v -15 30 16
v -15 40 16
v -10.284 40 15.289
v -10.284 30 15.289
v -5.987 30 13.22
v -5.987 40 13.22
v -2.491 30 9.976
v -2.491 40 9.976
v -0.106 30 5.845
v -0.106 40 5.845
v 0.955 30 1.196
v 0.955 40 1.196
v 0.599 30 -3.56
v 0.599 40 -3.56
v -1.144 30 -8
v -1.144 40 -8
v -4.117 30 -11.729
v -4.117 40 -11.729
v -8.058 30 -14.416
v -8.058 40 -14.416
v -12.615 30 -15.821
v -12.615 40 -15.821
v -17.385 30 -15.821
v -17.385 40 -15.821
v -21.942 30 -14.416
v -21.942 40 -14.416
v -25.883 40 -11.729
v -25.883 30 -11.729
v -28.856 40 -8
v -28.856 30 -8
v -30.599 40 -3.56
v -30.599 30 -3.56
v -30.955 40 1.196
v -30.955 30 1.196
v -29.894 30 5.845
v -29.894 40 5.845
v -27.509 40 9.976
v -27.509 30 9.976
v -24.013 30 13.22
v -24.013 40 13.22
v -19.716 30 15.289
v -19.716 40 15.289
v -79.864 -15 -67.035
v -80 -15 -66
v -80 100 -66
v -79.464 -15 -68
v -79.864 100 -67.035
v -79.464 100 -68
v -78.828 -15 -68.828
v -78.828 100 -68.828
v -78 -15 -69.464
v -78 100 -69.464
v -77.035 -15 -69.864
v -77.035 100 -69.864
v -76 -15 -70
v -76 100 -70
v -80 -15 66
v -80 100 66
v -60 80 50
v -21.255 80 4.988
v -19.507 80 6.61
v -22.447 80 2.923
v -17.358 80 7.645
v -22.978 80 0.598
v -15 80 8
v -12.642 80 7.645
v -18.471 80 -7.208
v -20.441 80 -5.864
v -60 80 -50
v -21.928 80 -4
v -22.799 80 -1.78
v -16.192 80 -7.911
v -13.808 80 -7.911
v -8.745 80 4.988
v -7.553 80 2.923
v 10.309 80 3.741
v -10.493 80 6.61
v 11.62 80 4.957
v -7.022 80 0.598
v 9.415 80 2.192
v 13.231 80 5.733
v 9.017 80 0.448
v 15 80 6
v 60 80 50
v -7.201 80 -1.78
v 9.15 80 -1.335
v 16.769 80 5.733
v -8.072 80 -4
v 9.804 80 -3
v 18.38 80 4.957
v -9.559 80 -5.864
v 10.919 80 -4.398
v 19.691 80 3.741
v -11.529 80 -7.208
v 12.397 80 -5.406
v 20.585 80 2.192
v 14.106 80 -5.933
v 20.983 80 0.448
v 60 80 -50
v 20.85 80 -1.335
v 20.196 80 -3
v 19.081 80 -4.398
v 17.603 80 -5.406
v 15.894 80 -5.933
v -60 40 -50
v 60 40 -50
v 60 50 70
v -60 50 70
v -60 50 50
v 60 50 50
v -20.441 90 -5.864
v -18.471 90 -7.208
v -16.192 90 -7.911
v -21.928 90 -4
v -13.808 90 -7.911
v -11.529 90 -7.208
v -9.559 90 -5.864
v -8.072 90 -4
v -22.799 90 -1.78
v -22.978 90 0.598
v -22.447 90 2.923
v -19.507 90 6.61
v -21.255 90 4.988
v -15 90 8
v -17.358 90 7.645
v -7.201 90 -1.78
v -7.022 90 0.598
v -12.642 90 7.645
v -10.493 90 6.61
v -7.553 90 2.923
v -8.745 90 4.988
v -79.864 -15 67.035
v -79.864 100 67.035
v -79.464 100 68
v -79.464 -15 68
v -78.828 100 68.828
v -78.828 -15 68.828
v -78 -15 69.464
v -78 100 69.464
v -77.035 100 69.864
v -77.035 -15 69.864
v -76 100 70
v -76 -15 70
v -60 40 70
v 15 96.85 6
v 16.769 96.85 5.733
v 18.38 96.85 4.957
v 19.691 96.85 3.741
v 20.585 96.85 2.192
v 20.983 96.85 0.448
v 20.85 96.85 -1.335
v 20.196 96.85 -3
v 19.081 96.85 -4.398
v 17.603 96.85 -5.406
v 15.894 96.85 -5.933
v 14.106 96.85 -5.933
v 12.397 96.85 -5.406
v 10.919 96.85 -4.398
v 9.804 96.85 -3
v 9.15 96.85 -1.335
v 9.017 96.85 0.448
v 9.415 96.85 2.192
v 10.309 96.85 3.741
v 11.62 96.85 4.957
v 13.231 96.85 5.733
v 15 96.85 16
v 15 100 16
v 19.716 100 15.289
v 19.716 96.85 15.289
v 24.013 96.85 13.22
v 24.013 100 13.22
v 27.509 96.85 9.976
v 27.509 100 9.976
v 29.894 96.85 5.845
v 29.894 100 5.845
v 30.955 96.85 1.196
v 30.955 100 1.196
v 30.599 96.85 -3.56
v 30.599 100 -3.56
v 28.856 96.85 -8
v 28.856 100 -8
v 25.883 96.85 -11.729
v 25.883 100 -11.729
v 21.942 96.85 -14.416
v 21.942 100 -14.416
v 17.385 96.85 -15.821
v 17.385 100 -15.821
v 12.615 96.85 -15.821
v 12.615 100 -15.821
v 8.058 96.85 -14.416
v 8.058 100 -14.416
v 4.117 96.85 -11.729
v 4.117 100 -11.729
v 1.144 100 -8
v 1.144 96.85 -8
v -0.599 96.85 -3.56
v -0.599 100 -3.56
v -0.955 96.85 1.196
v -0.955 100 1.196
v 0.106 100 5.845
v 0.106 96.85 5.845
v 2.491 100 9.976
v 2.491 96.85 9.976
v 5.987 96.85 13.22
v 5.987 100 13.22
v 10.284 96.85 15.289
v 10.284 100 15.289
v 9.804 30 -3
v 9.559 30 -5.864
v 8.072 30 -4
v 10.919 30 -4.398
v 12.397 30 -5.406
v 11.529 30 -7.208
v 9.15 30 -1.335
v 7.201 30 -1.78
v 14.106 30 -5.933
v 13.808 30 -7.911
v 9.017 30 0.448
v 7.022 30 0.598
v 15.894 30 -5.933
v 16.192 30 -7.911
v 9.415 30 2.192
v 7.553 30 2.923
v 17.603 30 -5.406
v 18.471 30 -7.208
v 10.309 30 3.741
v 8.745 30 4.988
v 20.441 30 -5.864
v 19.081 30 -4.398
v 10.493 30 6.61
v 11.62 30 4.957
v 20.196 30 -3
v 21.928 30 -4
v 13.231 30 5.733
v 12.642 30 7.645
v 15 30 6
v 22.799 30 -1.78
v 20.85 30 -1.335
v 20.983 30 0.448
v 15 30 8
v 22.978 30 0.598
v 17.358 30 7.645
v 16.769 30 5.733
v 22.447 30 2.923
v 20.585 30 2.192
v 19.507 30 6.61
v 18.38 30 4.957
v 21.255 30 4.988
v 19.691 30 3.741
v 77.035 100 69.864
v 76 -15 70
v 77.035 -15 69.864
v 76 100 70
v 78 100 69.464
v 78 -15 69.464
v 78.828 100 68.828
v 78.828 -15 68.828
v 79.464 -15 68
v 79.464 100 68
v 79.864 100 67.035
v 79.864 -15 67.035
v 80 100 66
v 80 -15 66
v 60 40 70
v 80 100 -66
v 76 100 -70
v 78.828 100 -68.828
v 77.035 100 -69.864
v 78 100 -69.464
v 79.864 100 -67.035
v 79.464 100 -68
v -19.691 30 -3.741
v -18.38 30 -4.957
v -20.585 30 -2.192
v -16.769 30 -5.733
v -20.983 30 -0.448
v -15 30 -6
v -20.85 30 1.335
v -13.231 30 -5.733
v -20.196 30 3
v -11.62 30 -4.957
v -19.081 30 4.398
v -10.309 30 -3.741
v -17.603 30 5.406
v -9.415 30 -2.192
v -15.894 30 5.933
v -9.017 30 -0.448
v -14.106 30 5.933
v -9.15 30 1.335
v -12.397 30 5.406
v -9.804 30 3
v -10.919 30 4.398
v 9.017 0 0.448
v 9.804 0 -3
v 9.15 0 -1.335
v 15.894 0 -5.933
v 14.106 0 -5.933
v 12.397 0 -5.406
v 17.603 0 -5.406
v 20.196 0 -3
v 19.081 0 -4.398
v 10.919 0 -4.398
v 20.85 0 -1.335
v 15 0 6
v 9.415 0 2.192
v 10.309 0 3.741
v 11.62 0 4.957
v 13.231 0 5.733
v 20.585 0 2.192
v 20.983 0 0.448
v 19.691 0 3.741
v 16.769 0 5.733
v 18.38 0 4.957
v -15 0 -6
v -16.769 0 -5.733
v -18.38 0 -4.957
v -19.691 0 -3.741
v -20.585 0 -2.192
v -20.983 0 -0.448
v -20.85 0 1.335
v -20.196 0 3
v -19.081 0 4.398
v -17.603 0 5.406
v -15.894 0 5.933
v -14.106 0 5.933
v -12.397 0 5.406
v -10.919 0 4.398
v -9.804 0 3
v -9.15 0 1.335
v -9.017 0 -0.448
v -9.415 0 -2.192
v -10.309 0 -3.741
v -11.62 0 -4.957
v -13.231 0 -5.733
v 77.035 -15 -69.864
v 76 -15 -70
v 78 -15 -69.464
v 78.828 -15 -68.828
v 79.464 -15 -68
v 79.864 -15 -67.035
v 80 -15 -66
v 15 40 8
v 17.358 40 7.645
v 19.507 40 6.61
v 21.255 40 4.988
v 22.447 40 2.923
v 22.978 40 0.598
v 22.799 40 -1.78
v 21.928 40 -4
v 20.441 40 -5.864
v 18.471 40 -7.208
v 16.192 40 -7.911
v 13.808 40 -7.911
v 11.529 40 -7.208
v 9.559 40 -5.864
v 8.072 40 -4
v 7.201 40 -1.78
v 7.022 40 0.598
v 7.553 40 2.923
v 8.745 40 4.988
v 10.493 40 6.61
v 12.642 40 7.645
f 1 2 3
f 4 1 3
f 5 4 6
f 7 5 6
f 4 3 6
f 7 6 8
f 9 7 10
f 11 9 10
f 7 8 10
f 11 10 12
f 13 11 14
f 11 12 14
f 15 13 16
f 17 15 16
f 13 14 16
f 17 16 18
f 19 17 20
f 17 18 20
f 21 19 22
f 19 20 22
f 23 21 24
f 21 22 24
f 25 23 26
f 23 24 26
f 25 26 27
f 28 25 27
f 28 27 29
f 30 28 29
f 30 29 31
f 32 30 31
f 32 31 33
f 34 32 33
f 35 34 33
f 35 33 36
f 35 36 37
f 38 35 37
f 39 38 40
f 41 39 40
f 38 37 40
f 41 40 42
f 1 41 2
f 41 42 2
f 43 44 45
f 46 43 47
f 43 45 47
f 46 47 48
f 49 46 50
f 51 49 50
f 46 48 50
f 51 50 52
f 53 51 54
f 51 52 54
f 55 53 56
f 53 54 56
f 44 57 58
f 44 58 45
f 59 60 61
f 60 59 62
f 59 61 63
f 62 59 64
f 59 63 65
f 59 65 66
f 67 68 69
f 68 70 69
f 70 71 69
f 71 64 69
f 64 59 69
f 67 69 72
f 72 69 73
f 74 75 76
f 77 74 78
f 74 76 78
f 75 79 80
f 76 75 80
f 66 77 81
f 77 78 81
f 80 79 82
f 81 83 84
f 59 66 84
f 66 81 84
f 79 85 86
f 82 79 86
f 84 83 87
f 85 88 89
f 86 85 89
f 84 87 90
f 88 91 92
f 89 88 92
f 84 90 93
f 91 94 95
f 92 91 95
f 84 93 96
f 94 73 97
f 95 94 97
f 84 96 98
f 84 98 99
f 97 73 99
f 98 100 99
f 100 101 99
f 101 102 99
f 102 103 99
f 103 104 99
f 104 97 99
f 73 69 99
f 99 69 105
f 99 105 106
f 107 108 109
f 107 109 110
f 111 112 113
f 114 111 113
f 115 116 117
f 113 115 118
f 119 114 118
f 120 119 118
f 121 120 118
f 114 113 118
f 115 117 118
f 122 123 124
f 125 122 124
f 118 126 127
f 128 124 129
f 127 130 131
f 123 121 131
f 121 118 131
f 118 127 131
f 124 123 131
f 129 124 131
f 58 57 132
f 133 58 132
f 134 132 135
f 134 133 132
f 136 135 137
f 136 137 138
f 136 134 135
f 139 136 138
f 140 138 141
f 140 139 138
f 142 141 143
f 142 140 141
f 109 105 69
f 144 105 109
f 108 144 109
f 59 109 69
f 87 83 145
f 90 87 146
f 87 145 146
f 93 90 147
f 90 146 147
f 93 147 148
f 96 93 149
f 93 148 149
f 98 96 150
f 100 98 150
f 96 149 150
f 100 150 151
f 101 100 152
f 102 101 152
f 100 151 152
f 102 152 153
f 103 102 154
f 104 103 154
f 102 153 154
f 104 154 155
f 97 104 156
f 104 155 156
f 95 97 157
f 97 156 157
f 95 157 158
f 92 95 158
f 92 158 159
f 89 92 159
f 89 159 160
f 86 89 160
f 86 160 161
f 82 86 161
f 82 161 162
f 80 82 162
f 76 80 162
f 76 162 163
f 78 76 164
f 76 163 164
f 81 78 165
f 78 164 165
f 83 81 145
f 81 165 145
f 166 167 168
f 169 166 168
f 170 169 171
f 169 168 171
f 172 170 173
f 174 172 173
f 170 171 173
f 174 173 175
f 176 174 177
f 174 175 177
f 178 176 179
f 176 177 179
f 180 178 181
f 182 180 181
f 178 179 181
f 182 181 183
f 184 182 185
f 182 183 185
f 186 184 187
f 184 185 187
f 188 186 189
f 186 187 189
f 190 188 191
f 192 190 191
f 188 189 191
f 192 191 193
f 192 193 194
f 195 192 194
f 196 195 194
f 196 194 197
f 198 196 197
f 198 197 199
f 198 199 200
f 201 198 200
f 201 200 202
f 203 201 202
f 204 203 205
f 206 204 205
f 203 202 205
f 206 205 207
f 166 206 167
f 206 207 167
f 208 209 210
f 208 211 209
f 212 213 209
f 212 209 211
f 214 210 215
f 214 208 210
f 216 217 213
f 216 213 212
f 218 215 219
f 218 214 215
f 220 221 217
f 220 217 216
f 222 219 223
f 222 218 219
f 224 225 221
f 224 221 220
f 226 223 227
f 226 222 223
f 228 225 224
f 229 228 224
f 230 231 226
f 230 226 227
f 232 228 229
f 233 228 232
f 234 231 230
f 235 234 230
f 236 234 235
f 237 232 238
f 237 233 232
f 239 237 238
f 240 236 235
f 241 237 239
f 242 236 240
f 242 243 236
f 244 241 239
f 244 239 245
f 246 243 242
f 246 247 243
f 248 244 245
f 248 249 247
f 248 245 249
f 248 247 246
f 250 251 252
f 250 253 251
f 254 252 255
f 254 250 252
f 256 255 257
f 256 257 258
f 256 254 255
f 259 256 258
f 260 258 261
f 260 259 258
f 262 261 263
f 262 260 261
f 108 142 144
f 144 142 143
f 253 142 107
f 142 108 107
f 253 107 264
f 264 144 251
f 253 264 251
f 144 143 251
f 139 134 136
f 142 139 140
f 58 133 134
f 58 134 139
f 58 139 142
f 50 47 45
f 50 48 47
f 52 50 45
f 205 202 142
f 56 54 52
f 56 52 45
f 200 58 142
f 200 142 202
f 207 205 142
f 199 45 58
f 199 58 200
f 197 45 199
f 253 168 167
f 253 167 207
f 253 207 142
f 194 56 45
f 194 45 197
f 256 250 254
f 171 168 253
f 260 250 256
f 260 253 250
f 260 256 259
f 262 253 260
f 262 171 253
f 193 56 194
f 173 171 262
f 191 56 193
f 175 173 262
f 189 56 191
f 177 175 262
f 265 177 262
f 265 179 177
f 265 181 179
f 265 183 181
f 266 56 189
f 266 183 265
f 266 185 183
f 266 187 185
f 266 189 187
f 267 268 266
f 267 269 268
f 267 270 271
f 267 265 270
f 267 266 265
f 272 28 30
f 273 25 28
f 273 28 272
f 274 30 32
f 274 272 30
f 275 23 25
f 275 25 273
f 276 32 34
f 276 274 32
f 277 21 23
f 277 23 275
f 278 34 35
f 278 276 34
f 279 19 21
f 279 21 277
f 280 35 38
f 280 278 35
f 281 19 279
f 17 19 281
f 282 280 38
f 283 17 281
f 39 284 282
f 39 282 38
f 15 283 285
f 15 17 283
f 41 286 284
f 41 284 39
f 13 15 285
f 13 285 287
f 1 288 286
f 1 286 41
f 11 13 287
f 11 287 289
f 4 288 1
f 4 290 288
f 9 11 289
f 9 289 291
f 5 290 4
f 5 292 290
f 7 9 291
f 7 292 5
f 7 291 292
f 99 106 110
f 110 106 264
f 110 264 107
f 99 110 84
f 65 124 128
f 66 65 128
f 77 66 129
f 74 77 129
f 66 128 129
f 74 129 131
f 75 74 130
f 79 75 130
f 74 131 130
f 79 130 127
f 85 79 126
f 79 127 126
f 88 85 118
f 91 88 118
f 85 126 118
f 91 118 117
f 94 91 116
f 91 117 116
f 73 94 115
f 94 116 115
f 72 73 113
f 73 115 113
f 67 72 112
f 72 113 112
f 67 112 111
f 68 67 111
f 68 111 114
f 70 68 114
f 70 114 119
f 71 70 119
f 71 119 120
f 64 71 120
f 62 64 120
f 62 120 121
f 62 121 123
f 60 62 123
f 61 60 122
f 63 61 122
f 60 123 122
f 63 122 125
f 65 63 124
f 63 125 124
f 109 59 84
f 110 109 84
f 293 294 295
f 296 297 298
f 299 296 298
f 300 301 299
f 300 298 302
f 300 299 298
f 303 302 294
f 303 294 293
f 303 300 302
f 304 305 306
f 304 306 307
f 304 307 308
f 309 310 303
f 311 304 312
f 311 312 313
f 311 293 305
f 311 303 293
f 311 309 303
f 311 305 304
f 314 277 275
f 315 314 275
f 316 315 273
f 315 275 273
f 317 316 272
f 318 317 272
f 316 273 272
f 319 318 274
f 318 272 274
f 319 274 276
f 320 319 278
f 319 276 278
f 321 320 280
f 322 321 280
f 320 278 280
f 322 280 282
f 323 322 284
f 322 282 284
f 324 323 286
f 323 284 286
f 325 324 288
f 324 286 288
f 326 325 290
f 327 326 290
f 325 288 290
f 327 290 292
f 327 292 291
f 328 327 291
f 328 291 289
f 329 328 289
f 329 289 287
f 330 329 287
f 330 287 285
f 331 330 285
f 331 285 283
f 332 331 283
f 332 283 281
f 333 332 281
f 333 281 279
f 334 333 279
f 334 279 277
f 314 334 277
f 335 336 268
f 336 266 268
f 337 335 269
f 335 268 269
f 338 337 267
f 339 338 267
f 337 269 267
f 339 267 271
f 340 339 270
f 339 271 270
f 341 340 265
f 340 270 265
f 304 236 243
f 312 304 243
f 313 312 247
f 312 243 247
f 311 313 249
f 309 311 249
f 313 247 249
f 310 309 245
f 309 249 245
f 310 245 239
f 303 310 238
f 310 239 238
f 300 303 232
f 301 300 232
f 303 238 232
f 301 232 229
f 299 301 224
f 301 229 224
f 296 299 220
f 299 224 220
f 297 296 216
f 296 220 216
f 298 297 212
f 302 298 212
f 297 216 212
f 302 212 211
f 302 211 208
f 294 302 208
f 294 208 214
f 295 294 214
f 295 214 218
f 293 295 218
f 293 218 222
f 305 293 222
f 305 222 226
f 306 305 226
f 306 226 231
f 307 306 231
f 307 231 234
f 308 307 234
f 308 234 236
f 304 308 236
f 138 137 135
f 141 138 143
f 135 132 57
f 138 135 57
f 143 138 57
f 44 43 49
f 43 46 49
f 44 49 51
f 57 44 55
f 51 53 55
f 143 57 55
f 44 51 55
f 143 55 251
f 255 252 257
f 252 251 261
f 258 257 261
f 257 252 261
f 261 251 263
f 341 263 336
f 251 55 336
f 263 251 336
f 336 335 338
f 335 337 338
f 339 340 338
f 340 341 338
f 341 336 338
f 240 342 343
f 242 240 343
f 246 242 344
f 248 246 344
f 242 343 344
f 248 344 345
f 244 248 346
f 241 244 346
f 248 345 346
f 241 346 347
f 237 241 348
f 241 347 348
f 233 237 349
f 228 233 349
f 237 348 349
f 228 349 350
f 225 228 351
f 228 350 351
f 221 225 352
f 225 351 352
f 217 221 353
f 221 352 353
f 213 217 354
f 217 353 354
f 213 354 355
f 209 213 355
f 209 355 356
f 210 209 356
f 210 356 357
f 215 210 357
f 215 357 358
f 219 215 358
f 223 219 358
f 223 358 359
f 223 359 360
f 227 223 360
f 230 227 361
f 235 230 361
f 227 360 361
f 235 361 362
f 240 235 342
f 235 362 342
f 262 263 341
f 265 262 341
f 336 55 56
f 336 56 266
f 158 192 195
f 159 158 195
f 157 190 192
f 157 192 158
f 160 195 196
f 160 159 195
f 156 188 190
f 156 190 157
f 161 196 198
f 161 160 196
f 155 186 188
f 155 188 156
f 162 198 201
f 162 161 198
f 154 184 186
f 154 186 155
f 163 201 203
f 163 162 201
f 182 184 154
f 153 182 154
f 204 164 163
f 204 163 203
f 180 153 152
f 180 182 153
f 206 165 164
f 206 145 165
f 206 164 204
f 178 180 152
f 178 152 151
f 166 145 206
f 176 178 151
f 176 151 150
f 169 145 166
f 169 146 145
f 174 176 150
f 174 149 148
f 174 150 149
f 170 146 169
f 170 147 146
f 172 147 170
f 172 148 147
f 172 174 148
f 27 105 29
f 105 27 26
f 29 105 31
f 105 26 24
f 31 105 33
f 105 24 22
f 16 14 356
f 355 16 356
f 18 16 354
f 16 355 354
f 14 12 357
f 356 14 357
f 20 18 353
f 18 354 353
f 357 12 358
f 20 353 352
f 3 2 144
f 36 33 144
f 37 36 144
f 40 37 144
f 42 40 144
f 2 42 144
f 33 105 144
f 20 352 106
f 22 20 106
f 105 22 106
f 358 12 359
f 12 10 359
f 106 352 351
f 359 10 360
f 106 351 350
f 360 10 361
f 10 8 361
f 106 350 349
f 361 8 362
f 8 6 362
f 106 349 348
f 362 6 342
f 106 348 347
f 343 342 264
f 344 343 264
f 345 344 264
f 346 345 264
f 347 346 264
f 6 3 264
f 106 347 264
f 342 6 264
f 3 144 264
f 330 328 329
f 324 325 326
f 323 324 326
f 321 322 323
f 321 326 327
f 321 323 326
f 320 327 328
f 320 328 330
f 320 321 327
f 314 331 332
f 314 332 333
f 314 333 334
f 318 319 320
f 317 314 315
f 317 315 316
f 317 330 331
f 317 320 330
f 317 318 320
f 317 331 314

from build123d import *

# Parameters (mm, degrees)
BOX_EXTRUDE_DEPTH             = 100
BOX_EXTRUDE_DEPTH_BACK        = 15
SKETCH2_W                     = 160
SKETCH2_H                     = 140
BOX_INNER_CUT_START           = -20
SKETCH3_W                     = 120
SKETCH3_H                     = 100
BOX_INNER_CUT_DEPTH           = 40
SHAFT_CUT_START               = -60
SKETCH6_R                     = 6
SHAFT_CUT_DEPTH               = 40
BEARING_CUTS_INSIDE_BOX_START = -60
SKETCH9_R                     = 8
SKETCH9_R_2                   = 16
BEARING_CUTS_INSIDE_BOX_DEPTH = 10
SKETCH11_W                    = 120
SKETCH11_H                    = 10
SCISSOR_CUT_DEPTH             = 20
SKETCH12_R                    = 16
MOTOR_HOLE_CUT_DEPTH          = 3.15
RIGHT_SHAFT_LID_CUT_REACH     = 156.306
SKETCH15_R                    = 6
LEFT_BEARING_LID_CUT_START    = -10
SKETCH18_R                    = 8
LEFT_BEARING_LID_CUT_DEPTH    = 10
OUTER_EDGES_FILLET_R          = 4


with BuildPart() as part:
    # Sketch2 → BOX_EXTRUDE (new, two sides: drawn at the far end of the back side and taken through both)
    with BuildSketch(Plane(origin=(0, 0, 0), x_dir=(1, 0, 0), z_dir=(0, 1, 0)).offset(-BOX_EXTRUDE_DEPTH_BACK)):
        Rectangle(SKETCH2_W, SKETCH2_H)
    extrude(amount=BOX_EXTRUDE_DEPTH + BOX_EXTRUDE_DEPTH_BACK)

    # Sketch3 → BOX_INNER_CUT (cut)
    with BuildSketch(Plane(origin=(0, 100, 0), x_dir=(1, 0, 0), z_dir=(0, 1, 0)).offset(BOX_INNER_CUT_START)):
        Rectangle(SKETCH3_W, SKETCH3_H)
    extrude(amount=-BOX_INNER_CUT_DEPTH, mode=Mode.SUBTRACT)

    # Sketch6 → SHAFT_CUT (cut)
    with BuildSketch(Plane(origin=(0, 100, 0), x_dir=(1, 0, 0), z_dir=(0, 1, 0)).offset(SHAFT_CUT_START)):
        with Locations(Location((15, 0, 0), (0, 0, 270))):
            Circle(SKETCH6_R)
        with Locations(Location((-15, 0, 0), (0, 0, 90))):
            Circle(SKETCH6_R)
    extrude(amount=-SHAFT_CUT_DEPTH, mode=Mode.SUBTRACT)

    # Sketch9 → BEARING_CUTS_INSIDE_BOX (cut)
    with BuildSketch(Plane(origin=(0, 100, 0), x_dir=(1, 0, 0), z_dir=(0, 1, 0)).offset(BEARING_CUTS_INSIDE_BOX_START)):
        with Locations(Location((15, 0, 0), (0, 0, 270))):
            Circle(SKETCH9_R)
        with Locations(Location((-15, 0, 0), (0, 0, 270))):
            Circle(SKETCH9_R_2)
    extrude(amount=-BEARING_CUTS_INSIDE_BOX_DEPTH, mode=Mode.SUBTRACT)

    # Sketch11 → SCISSOR_CUT (cut)
    with BuildSketch(Plane.XY.offset(70)):
        with Locations((0, 45)):
            Rectangle(SKETCH11_W, SKETCH11_H)
    extrude(amount=-SCISSOR_CUT_DEPTH, mode=Mode.SUBTRACT)

    # Sketch12 → MOTOR_HOLE_CUT (cut)
    with BuildSketch(Plane(origin=(0, 100, 0), x_dir=(1, 0, 0), z_dir=(0, 1, 0))):
        with Locations(Location((15, 0, 0), (0, 0, 270))):
            Circle(SKETCH12_R)
    extrude(amount=-MOTOR_HOLE_CUT_DEPTH, mode=Mode.SUBTRACT)

    # Sketch15 → RIGHT_SHAFT_LID_CUT (cut, up to next)
    with BuildSketch(Plane(origin=(0, 96.85, 0), x_dir=(1, 0, 0), z_dir=(0, 1, 0)), mode=Mode.PRIVATE) as right_shaft_lid_cut_sk1:
        with Locations(Location((15, 0, 0), (0, 0, 270))):
            Circle(SKETCH15_R)
    right_shaft_lid_cut_tool1 = extrude(right_shaft_lid_cut_sk1.sketch, amount=-RIGHT_SHAFT_LID_CUT_REACH, mode=Mode.PRIVATE) & part.part
    add(right_shaft_lid_cut_tool1.solids().sort_by_distance((15, 96.85, 0))[0], mode=Mode.SUBTRACT)

    # Sketch18 → LEFT_BEARING_LID_CUT (cut)
    with BuildSketch(Plane(origin=(0, 100, 0), x_dir=(1, 0, 0), z_dir=(0, 1, 0)).offset(LEFT_BEARING_LID_CUT_START)):
        with Locations(Location((-15, 0, 0), (0, 0, 270))):
            Circle(SKETCH18_R)
    extrude(amount=-LEFT_BEARING_LID_CUT_DEPTH, mode=Mode.SUBTRACT)

    # OUTER_EDGES_FILLET
    outer_edges_fillet_edges = [part.edges().sort_by_distance(p)[0] for p in [
        (-80, 42.5, -70),
        (80, 42.5, -70),
        (80, 42.5, 70),
        (-80, 42.5, 70),
    ]]
    fillet(outer_edges_fillet_edges, radius=OUTER_EDGES_FILLET_R)


solid = part.part
